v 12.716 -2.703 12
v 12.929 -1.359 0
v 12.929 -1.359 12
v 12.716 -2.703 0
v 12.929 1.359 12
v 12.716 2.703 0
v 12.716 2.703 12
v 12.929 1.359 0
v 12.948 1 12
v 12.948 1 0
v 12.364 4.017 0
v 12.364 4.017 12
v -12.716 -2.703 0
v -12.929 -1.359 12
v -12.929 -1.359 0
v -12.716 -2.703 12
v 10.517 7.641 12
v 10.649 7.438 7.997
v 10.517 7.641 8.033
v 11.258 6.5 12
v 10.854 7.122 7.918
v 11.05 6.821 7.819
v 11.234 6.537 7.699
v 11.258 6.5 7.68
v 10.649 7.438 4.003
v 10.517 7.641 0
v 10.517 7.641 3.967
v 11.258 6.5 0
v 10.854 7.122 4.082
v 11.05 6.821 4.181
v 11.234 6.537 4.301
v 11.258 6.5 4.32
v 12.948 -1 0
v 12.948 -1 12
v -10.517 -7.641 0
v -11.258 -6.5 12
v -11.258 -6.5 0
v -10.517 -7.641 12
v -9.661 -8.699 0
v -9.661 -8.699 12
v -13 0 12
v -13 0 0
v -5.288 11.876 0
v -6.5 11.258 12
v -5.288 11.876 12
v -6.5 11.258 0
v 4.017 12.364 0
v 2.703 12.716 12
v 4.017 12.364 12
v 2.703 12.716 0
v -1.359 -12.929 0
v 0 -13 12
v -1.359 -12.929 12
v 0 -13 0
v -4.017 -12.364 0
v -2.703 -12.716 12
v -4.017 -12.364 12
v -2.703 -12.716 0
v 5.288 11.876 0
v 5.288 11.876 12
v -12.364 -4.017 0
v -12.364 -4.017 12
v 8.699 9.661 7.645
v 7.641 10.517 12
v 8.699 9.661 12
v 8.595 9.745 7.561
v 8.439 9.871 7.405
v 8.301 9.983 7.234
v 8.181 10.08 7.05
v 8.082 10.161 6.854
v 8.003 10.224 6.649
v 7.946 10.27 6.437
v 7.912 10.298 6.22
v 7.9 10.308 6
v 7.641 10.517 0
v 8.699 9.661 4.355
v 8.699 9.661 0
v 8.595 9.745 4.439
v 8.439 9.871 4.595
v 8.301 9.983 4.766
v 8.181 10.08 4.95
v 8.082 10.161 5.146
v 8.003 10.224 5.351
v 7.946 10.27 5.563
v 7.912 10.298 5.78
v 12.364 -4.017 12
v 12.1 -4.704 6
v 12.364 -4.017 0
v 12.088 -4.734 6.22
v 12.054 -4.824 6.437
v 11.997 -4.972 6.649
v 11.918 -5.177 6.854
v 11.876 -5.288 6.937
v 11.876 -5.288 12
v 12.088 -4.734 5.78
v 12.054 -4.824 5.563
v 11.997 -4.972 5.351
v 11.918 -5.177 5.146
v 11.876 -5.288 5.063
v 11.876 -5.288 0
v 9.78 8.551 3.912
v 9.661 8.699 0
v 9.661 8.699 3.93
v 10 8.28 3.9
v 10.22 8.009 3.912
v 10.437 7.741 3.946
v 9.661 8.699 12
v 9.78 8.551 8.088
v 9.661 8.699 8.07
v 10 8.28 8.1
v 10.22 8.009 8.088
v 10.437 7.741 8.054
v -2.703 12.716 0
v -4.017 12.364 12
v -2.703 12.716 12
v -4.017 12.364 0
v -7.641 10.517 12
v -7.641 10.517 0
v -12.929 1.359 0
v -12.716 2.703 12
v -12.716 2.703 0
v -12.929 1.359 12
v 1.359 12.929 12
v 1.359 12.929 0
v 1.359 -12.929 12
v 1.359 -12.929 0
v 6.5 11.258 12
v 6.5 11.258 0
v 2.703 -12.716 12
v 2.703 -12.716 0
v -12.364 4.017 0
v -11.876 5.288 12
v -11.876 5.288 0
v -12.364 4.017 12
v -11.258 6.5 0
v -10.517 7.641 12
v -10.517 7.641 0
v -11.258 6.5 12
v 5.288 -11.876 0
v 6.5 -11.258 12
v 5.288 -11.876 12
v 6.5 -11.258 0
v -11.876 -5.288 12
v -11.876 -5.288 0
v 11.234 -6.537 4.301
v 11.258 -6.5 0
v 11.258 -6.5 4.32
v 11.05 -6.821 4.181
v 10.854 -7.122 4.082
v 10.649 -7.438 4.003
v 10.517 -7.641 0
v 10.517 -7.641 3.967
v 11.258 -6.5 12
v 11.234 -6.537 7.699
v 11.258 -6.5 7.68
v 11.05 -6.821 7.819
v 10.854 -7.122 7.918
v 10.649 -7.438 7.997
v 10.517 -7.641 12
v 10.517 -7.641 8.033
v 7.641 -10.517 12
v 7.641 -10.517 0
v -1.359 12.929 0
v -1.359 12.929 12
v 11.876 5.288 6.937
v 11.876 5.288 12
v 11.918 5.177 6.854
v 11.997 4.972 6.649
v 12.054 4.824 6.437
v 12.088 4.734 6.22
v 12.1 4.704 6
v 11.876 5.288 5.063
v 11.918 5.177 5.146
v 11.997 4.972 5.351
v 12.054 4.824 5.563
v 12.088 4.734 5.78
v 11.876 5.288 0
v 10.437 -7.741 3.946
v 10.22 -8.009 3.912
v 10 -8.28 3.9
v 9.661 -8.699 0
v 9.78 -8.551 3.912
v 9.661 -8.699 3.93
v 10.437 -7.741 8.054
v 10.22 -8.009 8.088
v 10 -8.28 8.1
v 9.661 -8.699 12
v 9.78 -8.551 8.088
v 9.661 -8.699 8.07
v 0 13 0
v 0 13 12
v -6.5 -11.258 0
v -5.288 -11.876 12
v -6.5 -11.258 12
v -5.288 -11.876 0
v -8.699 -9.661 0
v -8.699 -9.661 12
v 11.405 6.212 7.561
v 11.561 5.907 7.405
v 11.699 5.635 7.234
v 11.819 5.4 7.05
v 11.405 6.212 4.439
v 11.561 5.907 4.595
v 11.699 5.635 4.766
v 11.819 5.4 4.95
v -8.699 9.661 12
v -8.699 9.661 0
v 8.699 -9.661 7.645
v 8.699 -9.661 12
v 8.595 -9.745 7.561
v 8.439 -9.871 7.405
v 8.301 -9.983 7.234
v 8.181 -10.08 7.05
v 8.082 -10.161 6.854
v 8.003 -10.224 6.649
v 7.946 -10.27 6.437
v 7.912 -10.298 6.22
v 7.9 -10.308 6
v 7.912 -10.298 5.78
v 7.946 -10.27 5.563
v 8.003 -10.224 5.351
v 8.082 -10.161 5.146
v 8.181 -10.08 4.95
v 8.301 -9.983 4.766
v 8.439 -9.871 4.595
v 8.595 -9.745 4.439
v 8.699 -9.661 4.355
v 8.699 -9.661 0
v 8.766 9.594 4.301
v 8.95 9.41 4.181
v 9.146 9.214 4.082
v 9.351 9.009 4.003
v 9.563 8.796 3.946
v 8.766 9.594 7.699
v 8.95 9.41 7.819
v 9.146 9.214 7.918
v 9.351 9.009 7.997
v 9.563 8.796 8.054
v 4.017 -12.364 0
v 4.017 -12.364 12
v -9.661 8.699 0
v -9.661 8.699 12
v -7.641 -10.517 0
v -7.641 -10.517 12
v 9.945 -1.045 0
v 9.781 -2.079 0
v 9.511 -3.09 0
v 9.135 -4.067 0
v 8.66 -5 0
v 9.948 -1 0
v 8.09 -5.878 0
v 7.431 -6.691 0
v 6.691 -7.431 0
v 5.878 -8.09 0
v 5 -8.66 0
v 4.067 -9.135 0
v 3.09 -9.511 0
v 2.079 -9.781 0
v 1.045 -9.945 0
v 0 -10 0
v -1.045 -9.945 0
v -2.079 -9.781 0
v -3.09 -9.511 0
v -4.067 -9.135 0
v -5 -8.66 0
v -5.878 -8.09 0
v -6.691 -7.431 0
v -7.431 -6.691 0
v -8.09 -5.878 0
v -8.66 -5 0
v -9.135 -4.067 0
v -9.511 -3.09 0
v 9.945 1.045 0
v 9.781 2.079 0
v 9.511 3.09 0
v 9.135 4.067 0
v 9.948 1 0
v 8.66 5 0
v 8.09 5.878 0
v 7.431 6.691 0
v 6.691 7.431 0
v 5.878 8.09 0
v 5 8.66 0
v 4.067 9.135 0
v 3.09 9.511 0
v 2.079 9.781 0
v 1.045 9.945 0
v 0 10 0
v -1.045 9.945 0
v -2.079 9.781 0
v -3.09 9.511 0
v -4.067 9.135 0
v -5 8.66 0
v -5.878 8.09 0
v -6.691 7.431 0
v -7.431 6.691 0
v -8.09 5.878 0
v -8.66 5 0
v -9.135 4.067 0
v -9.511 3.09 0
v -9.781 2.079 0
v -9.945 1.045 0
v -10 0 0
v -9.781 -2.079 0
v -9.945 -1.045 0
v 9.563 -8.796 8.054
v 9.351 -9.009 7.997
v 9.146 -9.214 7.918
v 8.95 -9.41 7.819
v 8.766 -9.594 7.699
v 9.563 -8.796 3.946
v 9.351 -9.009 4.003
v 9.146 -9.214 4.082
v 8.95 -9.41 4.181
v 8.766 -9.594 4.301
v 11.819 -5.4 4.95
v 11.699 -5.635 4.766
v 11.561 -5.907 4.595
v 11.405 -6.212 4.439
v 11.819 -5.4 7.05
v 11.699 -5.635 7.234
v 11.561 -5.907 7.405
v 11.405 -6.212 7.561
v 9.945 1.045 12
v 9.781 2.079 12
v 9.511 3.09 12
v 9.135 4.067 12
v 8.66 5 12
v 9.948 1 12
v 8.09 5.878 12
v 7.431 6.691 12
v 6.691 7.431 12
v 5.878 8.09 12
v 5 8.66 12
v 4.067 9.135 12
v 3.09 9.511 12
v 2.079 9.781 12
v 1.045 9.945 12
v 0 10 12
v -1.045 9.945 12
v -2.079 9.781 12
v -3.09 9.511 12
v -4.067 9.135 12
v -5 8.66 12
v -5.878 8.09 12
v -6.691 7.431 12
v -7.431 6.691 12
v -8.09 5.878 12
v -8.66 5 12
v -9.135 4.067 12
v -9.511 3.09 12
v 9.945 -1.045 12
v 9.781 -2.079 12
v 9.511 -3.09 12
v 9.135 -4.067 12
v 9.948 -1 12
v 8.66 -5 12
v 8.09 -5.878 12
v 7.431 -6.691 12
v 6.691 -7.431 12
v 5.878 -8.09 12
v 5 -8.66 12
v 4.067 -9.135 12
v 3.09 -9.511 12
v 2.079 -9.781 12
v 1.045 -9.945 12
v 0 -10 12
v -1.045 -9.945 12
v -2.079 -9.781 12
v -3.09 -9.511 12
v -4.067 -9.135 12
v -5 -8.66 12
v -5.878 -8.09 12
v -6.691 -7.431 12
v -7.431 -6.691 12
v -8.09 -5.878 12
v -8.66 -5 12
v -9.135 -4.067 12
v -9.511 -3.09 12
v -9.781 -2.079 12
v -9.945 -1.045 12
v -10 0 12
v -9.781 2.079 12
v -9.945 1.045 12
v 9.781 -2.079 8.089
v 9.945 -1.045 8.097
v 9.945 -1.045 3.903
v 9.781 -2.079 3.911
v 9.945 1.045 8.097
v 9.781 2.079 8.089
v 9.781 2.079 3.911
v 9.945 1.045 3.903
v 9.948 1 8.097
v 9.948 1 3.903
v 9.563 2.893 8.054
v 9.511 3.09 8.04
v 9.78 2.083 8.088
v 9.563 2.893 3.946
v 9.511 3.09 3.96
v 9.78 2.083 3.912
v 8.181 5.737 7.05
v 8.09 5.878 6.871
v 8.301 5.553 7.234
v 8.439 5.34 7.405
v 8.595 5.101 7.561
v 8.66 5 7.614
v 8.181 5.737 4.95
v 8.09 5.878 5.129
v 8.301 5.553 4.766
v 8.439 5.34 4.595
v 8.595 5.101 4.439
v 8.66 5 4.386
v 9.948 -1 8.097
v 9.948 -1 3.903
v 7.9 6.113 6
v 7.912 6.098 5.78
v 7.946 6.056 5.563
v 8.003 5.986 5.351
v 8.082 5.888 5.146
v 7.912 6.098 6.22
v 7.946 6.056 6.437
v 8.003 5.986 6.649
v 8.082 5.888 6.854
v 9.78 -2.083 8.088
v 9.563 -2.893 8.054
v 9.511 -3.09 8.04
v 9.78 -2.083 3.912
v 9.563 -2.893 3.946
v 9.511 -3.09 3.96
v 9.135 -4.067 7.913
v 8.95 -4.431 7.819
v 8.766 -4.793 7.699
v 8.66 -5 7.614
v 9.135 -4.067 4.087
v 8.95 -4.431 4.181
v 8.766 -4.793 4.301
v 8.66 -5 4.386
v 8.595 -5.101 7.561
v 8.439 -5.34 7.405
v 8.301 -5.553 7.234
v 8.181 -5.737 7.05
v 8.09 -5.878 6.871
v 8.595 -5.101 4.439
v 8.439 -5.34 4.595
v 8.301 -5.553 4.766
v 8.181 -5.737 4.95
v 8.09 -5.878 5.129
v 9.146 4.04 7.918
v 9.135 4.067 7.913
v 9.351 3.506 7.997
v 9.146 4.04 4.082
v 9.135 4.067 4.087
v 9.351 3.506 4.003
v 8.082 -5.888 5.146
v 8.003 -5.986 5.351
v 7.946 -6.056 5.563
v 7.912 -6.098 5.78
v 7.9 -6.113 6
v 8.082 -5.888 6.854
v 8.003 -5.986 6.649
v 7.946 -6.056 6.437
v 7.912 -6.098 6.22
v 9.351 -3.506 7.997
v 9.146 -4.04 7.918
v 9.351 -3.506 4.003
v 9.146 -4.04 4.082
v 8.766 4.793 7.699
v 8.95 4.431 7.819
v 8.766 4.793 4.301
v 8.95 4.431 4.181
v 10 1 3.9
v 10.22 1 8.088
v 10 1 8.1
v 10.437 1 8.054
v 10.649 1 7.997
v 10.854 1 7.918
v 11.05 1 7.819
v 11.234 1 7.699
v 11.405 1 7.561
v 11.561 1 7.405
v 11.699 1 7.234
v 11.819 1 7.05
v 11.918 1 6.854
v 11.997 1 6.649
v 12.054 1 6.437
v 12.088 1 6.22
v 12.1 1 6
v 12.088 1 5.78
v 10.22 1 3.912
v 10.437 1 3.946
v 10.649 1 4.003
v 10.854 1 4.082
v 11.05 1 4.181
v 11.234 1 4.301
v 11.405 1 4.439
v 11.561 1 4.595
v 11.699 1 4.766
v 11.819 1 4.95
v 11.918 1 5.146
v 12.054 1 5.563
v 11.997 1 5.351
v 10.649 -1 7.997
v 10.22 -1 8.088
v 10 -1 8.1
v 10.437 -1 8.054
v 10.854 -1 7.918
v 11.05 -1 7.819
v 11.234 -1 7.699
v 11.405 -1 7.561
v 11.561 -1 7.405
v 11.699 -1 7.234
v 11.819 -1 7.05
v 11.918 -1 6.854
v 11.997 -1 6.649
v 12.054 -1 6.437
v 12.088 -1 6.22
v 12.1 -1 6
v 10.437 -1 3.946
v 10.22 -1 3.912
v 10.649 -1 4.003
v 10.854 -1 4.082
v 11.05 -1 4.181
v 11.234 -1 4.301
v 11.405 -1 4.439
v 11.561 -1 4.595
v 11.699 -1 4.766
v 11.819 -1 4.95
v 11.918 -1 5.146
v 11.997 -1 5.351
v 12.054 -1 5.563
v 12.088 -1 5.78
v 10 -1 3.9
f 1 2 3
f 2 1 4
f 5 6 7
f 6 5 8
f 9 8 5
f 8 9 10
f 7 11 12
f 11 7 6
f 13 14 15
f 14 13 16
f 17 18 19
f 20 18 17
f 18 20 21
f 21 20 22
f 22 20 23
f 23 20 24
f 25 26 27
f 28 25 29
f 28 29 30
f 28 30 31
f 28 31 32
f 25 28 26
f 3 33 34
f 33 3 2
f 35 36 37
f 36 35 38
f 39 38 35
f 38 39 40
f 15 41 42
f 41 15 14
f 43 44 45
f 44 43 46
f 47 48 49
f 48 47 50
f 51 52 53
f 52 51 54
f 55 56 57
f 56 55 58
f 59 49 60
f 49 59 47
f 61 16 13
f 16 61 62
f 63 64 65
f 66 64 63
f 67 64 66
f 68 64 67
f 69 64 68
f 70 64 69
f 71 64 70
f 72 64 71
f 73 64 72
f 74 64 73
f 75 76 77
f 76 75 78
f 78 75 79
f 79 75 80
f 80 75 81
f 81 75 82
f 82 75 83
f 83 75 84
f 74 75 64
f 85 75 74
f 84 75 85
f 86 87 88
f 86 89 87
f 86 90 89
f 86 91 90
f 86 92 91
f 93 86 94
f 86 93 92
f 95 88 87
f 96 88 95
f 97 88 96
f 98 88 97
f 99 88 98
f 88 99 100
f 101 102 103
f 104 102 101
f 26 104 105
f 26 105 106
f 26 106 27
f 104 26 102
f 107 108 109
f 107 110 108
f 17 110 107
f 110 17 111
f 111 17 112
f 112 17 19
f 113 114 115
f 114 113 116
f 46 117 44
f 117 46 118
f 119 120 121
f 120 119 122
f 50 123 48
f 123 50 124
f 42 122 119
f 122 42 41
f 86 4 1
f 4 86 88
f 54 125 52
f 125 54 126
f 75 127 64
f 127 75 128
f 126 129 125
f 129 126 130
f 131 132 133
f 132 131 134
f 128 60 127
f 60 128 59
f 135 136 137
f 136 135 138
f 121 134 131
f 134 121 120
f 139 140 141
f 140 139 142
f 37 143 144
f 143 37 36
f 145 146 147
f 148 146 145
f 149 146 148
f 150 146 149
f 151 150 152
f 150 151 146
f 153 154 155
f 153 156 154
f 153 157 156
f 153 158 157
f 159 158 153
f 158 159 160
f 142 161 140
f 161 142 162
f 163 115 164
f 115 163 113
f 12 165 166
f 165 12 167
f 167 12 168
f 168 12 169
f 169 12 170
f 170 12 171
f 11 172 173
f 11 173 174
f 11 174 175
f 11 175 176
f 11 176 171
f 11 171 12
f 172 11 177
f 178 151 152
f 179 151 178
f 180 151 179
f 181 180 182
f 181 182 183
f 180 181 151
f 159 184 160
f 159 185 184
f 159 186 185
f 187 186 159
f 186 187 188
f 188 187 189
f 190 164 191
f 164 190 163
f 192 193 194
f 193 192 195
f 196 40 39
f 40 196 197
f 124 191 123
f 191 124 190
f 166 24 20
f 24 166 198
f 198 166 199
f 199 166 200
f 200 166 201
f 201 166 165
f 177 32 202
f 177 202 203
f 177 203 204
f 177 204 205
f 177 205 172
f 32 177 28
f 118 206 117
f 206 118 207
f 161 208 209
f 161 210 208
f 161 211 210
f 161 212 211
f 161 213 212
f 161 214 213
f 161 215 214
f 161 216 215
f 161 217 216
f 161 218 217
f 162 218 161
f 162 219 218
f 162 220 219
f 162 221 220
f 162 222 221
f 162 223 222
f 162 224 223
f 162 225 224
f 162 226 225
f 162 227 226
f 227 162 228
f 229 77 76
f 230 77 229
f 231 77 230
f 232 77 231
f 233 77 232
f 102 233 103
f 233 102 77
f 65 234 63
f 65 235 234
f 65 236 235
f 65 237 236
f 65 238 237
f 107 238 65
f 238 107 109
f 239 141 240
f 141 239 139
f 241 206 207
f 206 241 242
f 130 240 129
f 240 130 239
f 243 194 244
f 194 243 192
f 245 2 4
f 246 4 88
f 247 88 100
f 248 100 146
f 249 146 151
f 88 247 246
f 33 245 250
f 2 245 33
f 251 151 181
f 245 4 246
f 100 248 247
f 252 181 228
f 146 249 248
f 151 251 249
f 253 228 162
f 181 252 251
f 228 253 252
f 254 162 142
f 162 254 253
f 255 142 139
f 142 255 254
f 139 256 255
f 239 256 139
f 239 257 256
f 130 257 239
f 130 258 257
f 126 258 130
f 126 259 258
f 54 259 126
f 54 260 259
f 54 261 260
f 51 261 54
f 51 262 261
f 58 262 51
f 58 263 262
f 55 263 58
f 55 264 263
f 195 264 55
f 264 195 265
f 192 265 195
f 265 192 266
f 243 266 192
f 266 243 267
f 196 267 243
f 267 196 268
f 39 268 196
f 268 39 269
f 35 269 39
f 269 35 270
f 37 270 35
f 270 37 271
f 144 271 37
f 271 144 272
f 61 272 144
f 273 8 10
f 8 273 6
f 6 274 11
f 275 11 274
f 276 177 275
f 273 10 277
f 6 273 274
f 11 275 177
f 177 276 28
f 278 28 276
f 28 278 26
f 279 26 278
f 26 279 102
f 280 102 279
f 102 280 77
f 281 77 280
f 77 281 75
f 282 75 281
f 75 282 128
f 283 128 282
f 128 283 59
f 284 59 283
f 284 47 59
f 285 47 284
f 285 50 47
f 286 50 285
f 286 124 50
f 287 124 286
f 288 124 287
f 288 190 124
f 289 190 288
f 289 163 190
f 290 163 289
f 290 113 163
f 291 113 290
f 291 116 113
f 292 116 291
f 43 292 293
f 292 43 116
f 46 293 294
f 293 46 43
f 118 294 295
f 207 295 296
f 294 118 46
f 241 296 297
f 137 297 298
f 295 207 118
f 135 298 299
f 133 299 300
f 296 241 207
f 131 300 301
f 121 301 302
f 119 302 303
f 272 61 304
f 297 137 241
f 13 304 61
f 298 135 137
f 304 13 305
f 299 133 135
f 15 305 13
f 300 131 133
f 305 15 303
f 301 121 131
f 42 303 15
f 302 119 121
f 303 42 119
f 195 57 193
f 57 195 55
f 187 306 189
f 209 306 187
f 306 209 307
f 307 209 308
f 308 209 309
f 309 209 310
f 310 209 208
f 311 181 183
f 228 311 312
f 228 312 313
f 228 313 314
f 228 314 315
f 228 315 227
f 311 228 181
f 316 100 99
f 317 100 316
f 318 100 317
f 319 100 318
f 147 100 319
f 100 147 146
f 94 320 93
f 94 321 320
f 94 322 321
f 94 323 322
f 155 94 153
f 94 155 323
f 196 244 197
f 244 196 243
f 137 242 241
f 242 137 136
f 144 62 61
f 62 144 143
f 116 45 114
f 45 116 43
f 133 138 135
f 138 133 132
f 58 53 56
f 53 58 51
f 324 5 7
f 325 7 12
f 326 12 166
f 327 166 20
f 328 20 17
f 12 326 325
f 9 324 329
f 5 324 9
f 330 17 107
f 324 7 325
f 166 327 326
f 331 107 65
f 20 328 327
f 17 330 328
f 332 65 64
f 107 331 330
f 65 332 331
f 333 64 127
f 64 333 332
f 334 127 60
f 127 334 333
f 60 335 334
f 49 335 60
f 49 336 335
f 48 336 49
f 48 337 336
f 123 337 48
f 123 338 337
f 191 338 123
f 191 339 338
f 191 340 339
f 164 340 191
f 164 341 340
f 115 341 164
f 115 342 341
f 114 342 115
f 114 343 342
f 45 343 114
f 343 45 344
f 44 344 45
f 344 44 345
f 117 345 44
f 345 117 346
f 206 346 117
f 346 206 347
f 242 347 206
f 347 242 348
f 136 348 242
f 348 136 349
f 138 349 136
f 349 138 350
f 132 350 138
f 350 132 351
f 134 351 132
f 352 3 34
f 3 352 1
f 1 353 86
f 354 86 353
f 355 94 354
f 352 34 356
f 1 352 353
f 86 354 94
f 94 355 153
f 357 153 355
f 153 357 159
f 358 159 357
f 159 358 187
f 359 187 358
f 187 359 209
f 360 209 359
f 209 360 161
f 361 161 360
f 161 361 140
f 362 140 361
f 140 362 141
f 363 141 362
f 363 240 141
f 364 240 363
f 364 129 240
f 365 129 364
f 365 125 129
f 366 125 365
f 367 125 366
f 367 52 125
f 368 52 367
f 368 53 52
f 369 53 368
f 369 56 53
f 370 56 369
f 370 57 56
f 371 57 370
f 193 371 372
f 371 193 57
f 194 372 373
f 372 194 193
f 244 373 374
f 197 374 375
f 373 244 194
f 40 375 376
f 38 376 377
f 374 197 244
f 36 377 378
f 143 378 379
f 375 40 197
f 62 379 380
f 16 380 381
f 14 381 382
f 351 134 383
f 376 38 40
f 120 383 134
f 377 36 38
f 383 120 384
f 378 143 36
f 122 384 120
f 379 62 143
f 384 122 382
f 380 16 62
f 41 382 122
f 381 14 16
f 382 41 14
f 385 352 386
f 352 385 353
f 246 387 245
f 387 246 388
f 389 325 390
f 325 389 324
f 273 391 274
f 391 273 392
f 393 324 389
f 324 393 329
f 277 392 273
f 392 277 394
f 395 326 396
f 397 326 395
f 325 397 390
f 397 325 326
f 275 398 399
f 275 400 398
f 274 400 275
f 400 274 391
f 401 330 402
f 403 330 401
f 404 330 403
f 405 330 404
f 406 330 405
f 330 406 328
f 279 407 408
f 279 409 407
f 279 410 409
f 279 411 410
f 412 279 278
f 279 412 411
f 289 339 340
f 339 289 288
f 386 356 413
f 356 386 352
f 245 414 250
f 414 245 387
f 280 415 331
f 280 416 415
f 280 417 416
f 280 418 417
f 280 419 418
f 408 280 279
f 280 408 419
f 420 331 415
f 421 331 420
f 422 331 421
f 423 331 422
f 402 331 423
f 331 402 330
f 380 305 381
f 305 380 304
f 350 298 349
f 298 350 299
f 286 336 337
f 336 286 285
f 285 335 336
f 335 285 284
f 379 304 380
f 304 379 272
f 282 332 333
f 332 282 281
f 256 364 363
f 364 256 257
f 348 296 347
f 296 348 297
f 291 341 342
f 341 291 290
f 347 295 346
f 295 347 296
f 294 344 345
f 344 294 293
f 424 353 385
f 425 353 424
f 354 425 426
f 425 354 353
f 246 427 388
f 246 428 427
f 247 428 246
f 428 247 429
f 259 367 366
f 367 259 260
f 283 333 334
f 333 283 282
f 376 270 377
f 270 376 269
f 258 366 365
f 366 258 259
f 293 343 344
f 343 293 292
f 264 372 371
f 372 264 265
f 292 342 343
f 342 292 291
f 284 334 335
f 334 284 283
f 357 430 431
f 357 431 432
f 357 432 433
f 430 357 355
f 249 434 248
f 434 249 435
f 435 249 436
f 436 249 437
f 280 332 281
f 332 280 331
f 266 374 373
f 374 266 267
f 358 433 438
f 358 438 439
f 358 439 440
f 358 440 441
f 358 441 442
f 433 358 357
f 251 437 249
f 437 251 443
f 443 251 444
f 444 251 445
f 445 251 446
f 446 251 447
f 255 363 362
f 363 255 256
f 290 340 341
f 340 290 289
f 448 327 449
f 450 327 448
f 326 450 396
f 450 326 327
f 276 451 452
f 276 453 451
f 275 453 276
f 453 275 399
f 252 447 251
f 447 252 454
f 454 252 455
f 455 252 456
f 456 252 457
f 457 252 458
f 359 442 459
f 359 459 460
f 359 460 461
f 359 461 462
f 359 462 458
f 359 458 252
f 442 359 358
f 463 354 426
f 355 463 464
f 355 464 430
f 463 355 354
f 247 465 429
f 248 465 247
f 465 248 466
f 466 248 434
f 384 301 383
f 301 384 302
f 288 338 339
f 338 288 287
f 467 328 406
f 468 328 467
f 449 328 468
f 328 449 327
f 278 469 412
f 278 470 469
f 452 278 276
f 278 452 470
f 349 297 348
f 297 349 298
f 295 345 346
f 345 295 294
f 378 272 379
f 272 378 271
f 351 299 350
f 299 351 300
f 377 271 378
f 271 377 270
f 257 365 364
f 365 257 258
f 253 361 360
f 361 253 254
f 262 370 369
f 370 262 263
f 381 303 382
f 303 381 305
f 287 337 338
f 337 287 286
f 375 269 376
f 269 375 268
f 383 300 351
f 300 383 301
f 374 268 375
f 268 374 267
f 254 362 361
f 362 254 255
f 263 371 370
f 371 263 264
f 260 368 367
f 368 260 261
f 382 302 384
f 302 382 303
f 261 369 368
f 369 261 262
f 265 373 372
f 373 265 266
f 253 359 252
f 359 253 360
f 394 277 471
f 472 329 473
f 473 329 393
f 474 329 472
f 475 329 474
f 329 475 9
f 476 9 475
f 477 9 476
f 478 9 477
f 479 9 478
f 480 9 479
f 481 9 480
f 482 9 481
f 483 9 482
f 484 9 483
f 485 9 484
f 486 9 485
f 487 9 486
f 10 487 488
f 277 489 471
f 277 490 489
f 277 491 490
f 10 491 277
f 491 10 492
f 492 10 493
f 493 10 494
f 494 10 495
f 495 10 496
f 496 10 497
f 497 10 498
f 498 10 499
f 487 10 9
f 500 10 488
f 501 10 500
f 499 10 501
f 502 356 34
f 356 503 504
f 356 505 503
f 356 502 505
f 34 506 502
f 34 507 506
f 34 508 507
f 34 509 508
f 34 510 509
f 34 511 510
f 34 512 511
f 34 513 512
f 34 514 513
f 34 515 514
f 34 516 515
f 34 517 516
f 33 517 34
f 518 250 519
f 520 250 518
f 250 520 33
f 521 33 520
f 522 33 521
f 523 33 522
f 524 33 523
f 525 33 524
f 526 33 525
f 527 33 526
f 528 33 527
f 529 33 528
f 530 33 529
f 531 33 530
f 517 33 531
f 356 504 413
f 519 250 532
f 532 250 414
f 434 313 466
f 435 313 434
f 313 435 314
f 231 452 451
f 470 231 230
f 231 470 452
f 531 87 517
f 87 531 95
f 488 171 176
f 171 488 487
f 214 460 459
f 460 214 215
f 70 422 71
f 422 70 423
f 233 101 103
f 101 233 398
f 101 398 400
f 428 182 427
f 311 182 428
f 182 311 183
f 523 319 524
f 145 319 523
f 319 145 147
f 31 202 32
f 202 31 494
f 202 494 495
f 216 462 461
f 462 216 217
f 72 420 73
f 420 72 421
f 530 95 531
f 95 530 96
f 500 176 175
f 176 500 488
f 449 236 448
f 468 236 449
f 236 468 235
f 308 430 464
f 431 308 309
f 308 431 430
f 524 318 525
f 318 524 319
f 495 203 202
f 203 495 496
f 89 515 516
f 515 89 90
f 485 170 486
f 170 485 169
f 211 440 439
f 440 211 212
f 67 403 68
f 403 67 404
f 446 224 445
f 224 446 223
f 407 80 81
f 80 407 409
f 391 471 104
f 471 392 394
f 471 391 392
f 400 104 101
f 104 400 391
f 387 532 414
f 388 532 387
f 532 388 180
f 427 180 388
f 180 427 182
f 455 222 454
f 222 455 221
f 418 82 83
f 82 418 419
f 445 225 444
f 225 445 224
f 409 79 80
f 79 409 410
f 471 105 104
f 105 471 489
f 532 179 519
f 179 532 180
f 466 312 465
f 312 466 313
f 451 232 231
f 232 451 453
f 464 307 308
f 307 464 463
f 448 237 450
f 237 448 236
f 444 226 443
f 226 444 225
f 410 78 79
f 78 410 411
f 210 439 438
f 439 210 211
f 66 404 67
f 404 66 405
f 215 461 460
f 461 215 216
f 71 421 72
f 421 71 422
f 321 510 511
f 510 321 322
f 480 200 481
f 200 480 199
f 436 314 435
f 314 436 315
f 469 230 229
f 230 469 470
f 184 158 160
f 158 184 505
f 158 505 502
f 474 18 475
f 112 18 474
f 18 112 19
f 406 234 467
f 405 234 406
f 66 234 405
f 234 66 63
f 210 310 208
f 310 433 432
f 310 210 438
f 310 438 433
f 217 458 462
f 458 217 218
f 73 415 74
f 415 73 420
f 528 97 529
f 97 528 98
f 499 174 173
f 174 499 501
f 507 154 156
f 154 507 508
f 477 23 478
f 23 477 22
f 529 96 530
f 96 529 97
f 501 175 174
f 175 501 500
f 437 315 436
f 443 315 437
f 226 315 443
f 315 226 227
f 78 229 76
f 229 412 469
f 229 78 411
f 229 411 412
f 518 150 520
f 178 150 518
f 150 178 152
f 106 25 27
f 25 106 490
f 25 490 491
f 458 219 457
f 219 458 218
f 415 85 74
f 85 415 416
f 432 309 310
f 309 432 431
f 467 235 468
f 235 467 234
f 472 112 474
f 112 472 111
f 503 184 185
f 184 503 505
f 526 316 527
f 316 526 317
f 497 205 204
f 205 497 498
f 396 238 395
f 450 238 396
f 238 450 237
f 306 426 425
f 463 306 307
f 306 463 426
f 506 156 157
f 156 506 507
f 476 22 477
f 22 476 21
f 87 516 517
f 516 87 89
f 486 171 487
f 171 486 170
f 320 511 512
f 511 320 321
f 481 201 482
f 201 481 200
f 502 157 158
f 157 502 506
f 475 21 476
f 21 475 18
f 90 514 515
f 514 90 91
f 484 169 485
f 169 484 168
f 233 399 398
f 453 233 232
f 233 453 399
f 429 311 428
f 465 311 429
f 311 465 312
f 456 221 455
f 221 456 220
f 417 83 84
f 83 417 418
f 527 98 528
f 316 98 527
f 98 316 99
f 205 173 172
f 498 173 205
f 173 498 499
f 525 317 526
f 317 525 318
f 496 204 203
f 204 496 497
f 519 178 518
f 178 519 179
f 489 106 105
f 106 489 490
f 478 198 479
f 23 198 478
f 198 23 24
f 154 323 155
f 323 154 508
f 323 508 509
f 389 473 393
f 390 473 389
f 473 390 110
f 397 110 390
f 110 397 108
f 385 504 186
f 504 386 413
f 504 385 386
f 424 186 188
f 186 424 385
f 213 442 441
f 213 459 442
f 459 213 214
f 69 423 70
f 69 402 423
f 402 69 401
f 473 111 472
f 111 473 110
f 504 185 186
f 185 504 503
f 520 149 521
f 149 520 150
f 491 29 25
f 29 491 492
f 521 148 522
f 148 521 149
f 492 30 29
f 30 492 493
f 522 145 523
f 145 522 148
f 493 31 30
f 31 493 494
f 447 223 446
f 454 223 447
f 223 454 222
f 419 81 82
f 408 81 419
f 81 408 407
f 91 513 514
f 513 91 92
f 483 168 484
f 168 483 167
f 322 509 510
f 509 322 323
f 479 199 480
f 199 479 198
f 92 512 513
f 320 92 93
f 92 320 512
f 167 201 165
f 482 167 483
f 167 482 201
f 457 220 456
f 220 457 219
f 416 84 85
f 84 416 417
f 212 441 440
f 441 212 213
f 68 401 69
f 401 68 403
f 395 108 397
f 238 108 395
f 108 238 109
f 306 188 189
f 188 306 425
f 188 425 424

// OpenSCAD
// C-style pipe clamp.
$fn = 60;
eps = 0.02;
pipe_d = 20;
wall = 3;
outer_d = pipe_d + 2 * wall;
width = 12;
slit = 2;
difference() {
    cylinder(d=outer_d,h=width);
    translate([0,0,-eps]) cylinder(d=pipe_d,h=width+2*eps);
    translate([0,-slit/2,-eps]) cube([outer_d/2+eps,slit,width+2*eps]);
    translate([outer_d/2-3,-outer_d/2-eps,width/2]) rotate([-90,0,0]) cylinder(d=4.2,h=outer_d+2*eps);
}
